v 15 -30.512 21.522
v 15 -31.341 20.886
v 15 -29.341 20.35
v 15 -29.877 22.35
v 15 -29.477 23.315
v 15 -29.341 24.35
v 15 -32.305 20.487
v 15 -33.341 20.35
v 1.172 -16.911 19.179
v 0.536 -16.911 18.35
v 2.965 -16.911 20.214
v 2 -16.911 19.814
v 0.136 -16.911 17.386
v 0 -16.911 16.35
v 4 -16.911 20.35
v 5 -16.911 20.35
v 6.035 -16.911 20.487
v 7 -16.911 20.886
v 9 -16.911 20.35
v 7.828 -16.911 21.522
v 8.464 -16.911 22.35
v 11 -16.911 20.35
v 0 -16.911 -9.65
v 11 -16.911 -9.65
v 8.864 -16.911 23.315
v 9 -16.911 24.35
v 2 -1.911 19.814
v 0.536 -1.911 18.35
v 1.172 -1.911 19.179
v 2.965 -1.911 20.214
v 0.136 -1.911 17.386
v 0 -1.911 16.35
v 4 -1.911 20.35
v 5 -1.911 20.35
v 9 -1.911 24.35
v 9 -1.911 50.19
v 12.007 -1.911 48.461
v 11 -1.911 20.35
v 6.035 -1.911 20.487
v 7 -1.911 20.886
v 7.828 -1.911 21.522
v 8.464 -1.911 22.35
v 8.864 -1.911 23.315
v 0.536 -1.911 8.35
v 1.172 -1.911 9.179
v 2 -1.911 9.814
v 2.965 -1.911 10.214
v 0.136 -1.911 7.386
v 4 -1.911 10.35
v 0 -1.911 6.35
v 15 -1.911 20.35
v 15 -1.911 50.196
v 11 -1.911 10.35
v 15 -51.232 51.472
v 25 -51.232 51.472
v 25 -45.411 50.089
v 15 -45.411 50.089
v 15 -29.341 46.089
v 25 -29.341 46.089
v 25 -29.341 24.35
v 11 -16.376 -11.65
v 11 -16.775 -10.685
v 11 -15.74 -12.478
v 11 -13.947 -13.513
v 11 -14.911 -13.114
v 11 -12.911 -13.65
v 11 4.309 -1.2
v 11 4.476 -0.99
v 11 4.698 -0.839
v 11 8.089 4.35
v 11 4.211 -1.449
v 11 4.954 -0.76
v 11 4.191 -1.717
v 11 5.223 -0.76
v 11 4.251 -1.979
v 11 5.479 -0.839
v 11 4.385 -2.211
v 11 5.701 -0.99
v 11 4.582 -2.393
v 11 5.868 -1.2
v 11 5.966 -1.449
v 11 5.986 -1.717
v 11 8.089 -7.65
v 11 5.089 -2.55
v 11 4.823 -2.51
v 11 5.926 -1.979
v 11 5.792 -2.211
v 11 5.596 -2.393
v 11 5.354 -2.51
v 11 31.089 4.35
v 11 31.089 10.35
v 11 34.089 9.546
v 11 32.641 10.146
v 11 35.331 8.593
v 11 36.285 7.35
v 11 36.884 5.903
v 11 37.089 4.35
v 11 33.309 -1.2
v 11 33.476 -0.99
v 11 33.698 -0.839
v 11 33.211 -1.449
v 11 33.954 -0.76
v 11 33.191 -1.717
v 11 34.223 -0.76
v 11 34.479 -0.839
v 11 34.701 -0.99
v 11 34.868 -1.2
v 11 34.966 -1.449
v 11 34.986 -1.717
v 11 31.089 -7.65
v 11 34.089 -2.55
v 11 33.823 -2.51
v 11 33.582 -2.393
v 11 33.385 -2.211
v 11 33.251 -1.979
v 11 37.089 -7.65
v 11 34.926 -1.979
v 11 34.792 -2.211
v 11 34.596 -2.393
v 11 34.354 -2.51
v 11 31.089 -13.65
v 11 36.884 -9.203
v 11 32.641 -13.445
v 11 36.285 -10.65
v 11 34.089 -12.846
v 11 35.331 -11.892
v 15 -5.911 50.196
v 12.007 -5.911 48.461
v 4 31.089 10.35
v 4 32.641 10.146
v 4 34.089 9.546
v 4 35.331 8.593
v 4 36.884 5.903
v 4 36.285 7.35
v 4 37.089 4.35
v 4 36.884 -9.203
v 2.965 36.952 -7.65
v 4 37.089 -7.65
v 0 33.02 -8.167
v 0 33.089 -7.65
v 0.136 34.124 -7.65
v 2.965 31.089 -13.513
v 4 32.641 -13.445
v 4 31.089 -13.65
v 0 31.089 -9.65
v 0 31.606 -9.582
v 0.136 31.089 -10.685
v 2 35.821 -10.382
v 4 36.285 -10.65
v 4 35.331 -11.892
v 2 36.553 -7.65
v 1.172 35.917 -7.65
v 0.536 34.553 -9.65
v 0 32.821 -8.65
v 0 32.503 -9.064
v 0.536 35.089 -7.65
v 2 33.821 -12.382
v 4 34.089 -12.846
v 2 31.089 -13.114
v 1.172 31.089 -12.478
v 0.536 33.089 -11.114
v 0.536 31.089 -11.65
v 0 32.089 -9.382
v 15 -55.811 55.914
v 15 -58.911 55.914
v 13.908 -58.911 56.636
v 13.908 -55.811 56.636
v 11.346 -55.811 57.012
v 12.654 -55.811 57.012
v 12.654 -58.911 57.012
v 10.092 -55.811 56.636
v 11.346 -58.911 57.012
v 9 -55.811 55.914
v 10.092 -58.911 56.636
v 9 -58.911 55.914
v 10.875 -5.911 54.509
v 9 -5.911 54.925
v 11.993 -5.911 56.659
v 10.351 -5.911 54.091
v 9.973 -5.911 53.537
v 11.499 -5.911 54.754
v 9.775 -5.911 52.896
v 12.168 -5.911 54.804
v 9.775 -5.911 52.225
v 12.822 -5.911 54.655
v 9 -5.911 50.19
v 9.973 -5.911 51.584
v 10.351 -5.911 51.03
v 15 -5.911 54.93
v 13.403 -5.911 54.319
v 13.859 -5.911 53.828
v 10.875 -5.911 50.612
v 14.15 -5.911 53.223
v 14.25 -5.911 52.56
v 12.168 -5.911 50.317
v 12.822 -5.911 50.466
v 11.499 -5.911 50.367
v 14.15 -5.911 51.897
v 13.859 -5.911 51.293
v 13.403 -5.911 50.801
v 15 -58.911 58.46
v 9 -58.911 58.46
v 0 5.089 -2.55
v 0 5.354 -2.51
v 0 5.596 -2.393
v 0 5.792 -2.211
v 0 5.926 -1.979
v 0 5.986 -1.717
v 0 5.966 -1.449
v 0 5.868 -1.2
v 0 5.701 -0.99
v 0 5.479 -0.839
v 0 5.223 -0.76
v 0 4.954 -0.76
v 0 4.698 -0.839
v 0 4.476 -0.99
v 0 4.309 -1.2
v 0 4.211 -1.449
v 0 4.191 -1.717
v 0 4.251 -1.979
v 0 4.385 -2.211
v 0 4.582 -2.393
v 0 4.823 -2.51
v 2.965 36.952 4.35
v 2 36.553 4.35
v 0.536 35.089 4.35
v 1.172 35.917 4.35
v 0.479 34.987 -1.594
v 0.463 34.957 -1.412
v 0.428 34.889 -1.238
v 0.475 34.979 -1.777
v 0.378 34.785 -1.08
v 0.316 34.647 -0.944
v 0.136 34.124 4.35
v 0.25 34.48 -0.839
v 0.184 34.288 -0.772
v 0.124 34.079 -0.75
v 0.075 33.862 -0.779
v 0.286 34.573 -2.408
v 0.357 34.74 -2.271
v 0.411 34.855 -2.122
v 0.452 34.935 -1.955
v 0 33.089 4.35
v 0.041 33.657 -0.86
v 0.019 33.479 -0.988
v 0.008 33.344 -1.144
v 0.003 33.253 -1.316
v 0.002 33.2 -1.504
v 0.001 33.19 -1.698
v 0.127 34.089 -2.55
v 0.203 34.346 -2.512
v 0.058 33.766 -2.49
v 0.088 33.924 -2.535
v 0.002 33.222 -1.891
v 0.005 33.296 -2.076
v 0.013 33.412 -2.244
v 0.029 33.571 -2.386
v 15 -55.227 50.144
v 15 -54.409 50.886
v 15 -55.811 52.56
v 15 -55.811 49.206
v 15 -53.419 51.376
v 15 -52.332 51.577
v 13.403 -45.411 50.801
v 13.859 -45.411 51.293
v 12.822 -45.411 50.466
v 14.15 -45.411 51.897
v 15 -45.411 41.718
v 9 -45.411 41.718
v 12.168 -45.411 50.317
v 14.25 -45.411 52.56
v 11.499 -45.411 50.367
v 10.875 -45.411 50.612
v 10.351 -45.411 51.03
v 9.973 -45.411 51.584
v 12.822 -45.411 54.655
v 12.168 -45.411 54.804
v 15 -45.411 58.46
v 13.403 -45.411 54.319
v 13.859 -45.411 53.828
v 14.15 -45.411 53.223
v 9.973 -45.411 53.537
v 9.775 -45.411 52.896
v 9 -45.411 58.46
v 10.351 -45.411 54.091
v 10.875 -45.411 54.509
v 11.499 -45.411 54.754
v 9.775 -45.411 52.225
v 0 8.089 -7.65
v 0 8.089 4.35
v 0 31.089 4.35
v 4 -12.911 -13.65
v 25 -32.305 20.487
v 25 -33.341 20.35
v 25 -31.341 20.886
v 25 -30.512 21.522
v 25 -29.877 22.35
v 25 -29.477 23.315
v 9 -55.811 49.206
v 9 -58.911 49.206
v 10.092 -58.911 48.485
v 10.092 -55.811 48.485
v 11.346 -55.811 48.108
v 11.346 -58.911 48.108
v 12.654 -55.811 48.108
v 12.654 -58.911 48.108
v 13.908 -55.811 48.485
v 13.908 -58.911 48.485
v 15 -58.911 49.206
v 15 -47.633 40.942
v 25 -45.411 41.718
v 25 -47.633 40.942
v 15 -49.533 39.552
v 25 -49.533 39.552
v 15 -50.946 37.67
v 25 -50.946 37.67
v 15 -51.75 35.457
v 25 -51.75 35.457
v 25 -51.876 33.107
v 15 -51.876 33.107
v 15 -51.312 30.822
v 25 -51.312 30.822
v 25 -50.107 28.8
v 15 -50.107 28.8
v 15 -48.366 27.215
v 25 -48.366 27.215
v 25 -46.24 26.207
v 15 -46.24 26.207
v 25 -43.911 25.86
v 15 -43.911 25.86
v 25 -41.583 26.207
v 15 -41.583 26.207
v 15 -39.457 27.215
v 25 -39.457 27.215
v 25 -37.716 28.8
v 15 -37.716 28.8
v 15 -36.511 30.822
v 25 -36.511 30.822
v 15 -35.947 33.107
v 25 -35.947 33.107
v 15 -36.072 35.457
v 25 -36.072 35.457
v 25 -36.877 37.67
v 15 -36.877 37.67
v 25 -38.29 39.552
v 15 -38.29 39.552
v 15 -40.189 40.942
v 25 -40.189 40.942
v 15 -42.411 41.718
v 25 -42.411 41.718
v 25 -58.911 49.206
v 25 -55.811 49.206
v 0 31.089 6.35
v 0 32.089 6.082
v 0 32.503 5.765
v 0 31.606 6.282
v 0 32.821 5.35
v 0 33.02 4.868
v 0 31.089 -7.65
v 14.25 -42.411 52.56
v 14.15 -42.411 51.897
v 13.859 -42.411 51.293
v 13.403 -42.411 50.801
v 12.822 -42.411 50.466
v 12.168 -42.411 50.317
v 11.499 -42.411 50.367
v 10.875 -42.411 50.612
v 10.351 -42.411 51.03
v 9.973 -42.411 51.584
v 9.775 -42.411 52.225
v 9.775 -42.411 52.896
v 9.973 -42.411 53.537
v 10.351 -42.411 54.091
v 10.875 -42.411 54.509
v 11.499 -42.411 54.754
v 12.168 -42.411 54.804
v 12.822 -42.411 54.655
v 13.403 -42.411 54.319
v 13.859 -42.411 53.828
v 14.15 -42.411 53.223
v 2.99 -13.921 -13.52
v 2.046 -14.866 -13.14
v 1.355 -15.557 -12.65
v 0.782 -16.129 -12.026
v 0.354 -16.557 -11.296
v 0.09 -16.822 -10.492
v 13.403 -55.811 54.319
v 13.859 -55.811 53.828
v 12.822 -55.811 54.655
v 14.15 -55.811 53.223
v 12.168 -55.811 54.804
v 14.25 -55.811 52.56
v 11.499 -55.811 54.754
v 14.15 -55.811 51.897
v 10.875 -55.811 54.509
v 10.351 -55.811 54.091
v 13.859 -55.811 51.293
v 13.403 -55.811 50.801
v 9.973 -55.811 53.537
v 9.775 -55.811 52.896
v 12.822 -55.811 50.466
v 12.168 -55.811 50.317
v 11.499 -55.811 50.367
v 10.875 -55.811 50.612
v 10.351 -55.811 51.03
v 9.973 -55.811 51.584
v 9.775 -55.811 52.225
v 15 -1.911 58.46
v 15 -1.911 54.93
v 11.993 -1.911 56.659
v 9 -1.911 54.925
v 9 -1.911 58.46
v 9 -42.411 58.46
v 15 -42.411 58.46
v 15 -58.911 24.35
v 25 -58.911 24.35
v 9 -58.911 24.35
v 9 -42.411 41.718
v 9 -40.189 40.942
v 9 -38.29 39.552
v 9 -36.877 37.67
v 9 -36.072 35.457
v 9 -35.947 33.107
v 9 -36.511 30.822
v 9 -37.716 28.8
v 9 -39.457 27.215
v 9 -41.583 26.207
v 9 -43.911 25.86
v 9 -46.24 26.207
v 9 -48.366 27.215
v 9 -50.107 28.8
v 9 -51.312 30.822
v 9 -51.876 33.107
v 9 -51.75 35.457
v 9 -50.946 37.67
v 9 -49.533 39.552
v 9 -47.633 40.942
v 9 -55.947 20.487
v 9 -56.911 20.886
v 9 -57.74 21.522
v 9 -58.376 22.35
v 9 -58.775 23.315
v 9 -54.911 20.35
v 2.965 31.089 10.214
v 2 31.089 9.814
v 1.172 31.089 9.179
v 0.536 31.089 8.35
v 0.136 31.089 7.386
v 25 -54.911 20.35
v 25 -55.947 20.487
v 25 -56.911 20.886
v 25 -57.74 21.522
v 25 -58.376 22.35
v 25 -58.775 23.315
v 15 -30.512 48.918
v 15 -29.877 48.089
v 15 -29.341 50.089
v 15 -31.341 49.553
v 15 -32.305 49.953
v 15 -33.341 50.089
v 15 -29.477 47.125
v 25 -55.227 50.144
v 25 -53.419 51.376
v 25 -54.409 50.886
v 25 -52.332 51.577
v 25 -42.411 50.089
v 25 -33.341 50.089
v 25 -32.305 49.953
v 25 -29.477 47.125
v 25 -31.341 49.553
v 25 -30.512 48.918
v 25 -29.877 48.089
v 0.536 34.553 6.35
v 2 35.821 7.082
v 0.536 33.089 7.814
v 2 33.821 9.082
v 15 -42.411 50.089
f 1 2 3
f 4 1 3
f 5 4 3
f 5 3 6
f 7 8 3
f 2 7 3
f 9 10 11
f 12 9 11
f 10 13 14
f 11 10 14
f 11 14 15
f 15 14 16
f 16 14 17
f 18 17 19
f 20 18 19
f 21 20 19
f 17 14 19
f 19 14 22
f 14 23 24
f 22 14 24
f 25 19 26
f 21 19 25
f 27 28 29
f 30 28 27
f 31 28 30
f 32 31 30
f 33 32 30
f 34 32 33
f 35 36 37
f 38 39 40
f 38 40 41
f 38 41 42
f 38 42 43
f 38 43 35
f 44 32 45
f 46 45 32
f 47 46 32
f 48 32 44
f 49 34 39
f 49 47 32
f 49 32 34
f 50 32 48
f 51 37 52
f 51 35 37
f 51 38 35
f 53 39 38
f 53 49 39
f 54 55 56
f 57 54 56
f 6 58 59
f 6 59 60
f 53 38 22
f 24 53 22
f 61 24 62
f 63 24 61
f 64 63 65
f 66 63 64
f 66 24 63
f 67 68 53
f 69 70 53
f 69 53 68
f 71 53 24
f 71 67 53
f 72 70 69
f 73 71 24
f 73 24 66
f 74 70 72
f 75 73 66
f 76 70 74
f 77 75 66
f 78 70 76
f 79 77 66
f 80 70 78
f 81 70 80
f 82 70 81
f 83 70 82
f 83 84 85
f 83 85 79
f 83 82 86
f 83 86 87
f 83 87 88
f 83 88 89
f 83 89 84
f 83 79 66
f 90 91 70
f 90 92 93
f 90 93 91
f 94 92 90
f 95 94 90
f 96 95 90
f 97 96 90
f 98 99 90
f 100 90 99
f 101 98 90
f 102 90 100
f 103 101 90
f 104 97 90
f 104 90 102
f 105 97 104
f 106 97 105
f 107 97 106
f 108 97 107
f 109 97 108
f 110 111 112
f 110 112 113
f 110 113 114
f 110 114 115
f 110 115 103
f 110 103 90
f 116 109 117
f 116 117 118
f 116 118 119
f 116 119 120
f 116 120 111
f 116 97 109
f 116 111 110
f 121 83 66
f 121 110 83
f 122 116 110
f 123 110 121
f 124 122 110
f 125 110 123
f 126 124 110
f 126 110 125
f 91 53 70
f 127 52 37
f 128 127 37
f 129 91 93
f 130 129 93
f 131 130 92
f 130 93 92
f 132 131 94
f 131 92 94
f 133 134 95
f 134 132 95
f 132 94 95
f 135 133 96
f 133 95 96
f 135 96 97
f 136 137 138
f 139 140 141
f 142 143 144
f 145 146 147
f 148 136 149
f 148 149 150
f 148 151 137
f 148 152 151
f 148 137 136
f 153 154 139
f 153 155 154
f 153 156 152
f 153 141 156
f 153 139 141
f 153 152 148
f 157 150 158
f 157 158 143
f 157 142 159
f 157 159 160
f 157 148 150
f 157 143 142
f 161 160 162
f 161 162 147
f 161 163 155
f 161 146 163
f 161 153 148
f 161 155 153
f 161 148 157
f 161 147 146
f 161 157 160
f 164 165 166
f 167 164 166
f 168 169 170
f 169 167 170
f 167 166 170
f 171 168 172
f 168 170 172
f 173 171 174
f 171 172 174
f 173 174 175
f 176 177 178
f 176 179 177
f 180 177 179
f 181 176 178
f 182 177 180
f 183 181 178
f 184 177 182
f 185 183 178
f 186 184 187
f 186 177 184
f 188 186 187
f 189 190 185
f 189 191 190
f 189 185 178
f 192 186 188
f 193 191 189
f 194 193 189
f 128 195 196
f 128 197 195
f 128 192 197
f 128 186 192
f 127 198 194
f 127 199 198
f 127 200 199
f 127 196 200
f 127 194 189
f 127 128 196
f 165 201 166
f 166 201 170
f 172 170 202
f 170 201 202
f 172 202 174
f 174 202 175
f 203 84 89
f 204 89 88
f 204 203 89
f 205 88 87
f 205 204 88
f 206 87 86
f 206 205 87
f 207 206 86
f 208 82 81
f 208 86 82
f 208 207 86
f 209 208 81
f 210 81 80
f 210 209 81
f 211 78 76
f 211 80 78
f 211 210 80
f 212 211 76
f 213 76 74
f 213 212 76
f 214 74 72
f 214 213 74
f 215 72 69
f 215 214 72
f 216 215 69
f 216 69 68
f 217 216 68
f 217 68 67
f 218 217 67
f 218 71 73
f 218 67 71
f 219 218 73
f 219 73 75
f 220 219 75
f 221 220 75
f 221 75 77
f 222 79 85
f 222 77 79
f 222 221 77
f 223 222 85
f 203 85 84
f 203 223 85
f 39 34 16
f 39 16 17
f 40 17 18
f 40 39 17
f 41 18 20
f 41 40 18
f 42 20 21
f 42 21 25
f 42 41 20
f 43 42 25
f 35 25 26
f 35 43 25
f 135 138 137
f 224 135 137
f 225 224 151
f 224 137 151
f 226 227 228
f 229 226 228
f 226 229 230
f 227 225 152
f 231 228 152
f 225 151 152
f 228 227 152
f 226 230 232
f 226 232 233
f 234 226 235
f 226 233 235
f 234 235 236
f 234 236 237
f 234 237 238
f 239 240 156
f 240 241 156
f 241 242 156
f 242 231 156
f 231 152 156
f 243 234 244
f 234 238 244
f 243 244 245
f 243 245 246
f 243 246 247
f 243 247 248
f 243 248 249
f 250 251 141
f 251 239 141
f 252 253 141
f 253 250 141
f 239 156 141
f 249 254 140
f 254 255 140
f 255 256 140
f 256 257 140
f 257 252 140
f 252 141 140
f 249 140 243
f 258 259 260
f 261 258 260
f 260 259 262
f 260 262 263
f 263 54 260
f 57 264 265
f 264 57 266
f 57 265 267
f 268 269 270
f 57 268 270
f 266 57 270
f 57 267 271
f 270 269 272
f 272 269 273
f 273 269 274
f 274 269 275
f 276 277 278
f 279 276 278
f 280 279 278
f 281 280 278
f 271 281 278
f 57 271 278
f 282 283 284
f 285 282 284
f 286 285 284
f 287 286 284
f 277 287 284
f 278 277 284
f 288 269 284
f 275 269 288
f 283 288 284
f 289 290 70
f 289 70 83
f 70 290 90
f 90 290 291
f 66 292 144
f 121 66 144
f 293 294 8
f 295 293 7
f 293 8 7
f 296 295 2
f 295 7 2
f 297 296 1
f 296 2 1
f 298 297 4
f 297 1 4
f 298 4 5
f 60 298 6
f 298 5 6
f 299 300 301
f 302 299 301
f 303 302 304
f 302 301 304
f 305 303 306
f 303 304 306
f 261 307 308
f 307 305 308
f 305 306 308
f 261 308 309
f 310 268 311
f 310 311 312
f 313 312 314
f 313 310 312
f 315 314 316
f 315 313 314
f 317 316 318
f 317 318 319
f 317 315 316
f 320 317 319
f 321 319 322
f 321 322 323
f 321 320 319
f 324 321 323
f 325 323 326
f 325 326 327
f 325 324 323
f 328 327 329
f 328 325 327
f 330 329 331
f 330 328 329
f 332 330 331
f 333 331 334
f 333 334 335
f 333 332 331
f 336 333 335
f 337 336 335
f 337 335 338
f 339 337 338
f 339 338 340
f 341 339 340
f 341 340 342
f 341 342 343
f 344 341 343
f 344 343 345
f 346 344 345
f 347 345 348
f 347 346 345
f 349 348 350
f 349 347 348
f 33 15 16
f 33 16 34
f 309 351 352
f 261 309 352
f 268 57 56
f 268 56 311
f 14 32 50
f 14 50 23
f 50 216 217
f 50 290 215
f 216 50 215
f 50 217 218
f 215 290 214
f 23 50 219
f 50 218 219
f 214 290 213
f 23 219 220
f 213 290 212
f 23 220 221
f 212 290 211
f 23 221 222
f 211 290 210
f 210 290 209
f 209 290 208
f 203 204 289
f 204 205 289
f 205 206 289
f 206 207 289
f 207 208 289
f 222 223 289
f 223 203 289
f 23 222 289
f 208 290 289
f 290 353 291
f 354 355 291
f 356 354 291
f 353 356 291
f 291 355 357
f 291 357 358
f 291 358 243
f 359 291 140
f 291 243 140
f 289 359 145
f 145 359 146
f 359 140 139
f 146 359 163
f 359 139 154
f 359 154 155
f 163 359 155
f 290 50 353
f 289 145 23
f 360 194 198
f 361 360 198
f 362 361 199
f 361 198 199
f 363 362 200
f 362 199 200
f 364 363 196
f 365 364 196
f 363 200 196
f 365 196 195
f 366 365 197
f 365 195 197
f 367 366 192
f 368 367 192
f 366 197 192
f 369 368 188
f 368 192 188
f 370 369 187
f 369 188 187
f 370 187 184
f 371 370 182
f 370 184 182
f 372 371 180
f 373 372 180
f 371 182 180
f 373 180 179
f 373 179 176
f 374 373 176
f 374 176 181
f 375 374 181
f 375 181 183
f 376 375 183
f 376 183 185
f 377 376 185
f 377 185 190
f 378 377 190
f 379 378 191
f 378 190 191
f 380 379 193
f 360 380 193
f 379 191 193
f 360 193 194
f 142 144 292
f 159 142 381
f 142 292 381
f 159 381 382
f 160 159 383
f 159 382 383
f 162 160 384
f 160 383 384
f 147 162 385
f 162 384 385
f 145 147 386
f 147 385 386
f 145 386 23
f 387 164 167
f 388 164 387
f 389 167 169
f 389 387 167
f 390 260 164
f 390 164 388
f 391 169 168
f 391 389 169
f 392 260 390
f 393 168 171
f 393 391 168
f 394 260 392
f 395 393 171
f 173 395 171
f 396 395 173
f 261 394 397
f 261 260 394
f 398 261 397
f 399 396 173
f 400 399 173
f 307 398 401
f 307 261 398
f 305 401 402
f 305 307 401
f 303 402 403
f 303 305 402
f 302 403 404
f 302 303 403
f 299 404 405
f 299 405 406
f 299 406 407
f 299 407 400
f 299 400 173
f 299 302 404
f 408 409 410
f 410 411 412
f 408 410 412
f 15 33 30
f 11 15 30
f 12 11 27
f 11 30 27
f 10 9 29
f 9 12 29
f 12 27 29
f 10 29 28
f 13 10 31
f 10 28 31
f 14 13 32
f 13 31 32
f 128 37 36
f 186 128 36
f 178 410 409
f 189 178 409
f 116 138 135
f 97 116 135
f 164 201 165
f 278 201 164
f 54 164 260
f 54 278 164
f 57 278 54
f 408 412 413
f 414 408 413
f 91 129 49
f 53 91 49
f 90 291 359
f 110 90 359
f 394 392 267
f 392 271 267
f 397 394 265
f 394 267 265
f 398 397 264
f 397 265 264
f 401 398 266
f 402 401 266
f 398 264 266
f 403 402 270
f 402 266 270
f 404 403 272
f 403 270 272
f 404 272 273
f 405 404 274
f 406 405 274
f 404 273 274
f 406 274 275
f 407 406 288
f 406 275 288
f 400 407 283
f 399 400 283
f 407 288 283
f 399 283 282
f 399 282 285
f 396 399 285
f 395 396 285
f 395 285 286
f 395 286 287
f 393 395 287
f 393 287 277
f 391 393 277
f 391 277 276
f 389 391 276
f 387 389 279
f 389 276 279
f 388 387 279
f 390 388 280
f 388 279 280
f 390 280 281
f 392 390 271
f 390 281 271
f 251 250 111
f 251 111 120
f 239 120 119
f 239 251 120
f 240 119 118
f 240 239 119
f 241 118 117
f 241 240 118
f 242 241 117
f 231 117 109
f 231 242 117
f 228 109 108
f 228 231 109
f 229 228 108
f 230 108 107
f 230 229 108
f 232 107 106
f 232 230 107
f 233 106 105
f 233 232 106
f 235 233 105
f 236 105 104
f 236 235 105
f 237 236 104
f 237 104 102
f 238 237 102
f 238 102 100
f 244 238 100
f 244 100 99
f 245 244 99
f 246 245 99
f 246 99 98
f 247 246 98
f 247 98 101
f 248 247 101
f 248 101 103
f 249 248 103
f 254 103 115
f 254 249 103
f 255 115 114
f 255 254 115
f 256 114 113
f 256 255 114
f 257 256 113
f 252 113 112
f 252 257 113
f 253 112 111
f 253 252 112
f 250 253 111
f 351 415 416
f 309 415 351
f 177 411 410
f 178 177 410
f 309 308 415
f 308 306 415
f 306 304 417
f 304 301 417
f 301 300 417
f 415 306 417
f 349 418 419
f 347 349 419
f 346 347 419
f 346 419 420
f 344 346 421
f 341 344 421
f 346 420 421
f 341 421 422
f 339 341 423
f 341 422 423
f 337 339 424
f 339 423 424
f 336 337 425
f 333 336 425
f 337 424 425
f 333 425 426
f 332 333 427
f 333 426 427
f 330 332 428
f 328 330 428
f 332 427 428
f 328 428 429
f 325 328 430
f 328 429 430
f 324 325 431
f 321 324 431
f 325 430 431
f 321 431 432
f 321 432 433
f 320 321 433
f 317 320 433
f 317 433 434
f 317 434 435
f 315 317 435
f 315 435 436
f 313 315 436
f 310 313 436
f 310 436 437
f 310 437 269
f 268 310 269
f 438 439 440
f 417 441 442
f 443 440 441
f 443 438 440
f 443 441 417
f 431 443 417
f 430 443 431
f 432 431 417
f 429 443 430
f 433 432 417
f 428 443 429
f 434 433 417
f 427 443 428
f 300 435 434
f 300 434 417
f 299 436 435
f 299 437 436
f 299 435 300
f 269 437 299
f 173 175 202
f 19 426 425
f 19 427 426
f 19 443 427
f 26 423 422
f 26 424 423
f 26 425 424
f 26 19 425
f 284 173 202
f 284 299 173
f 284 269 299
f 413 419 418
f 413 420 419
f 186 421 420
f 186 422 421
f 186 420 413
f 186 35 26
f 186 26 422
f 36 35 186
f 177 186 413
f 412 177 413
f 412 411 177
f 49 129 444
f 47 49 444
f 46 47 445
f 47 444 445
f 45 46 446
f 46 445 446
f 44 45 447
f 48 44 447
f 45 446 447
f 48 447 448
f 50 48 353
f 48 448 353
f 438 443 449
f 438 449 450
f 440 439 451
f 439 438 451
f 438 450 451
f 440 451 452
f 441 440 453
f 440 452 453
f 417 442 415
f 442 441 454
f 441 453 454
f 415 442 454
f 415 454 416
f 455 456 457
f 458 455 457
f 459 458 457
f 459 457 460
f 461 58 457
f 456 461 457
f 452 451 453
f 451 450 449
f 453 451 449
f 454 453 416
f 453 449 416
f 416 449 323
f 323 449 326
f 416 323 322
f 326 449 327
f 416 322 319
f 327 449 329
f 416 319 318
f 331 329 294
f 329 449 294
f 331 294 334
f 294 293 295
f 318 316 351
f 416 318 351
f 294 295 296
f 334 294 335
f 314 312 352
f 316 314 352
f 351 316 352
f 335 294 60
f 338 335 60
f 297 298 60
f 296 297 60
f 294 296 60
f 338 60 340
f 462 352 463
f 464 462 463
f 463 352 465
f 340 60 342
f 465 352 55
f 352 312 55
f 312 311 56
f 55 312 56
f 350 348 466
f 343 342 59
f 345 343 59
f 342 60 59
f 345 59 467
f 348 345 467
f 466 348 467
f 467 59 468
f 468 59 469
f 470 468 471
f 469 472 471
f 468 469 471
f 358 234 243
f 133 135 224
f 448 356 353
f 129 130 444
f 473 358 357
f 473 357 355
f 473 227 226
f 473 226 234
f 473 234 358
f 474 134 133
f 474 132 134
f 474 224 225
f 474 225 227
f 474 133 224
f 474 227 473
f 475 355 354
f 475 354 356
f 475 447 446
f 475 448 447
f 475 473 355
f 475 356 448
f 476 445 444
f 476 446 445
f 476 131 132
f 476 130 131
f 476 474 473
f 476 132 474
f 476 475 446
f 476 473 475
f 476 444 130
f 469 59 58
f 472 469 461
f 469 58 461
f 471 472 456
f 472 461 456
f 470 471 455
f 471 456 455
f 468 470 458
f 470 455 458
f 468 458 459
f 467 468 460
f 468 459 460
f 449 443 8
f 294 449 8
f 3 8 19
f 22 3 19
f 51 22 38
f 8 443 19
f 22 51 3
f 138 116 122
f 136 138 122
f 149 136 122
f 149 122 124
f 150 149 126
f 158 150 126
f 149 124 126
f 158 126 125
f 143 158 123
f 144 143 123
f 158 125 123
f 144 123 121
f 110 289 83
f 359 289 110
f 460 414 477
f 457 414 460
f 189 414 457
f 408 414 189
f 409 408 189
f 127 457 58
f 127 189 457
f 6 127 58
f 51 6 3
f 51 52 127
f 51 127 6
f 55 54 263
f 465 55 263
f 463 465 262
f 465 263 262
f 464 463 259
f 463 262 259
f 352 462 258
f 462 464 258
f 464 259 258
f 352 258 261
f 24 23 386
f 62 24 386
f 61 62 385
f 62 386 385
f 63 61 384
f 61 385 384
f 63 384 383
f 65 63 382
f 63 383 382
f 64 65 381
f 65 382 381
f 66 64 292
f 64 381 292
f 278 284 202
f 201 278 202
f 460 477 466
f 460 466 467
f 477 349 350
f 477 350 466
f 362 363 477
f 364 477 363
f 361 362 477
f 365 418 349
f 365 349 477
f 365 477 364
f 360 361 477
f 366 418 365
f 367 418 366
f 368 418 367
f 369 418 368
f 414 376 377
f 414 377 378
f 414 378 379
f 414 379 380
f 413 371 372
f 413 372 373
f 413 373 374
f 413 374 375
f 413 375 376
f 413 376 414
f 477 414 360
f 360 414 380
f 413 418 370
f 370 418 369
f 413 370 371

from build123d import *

# Parameters (mm, degrees)
SKETCH1_R                                        = 0.9
SKETCH1_W                                        = 12
SKETCH1_H                                        = 23
BOSS_EXTRUDE1_DEPTH                              = 15
CBORE_FOR_M4_PAN_HEAD_MACHINE_SCREW2_D           = 4.5
CBORE_FOR_M4_PAN_HEAD_MACHINE_SCREW2_CBORE_D     = 9
CBORE_FOR_M4_PAN_HEAD_MACHINE_SCREW2_CBORE_DEPTH = 3.1
CUT_EXTRUDE2_DEPTH                               = 4
SKETCH11_W                                       = 38.11
SKETCH11_H                                       = 57
CUT_EXTRUDE3_DEPTH                               = 9
FILLET3_R                                        = 6
FILLET4_R                                        = 4
BOSS_EXTRUDE2_DEPTH                              = 10
FILLET2_R                                        = 4
SKETCH14_W                                       = 40.700591816
SKETCH14_H                                       = 70
CUT_EXTRUDE4_DEPTH                               = 4


with BuildPart() as part:
    # Sketch1 → Boss-Extrude1 (new body)
    with BuildSketch(Plane(origin=(0, 0, 0), x_dir=(0, 0, -1), z_dir=(1, 0, 0))):
        with BuildLine():
            Line((-58.460295908, -42.411439664), (-41.718412731, -42.411439664))
            ThreePointArc((-41.718412731, -42.411439664), (-25.860295908, -43.911439664), (-41.718412731, -45.411439664))
            Line((-41.718412731, -45.411439664), (-58.460295908, -45.411439664))
            Line((-58.460295908, -45.411439664), (-58.460295908, -58.911439664))
            Line((-58.460295908, -58.911439664), (-20.350295908, -58.911439664))
            Line((-20.350295908, -58.911439664), (-20.350295908, -16.911439664))
            Line((-20.350295908, -16.911439664), (13.649704092, -16.911439664))
            Line((13.649704092, -16.911439664), (13.649704092, 37.088560336))
            Line((13.649704092, 37.088560336), (-10.350295908, 37.088560336))
            Line((-10.350295908, 37.088560336), (-10.350295908, -1.911439664))
            Line((-10.350295908, -1.911439664), (-58.460295908, -1.911439664))
            Line((-58.460295908, -1.911439664), (-58.460295908, -28.911439664))
            Line((-58.460295908, -28.911439664), (-58.460295908, -42.411439664))
        make_face()
        with Locations((1.649704092, 34.088560336)):
            Circle(SKETCH1_R, mode=Mode.SUBTRACT)
        with Locations((1.649704092, 5.088560336)):
            Circle(SKETCH1_R, mode=Mode.SUBTRACT)
        with Locations((1.649704092, 19.588560336)):
            Rectangle(SKETCH1_W, SKETCH1_H, mode=Mode.SUBTRACT)
    extrude(amount=BOSS_EXTRUDE1_DEPTH)

    # CBORE for M4 Pan Head Machine Screw2 (through all)
    with Locations(Plane(origin=(0, -58.911439664, 0), x_dir=(-1, 0, 0), z_dir=(0, -1, 0))):
        with Locations((-12, -52.560295908)):
            CounterBoreHole(CBORE_FOR_M4_PAN_HEAD_MACHINE_SCREW2_D / 2, CBORE_FOR_M4_PAN_HEAD_MACHINE_SCREW2_CBORE_D / 2, CBORE_FOR_M4_PAN_HEAD_MACHINE_SCREW2_CBORE_DEPTH)

    # Sketch7 → Cut-Extrude2 (cut)
    with BuildSketch(Plane(origin=(0, -1.911439664, 0), x_dir=(1, 0, 0), z_dir=(0, 1, 0))):
        Polygon((15.553380664, -50.516569118), (12.006771014, -48.461114589), (8.45339035, -50.504841379), (8.446619336, -54.604022698), (11.993228986, -56.659477227), (15.54660965, -54.615750437), align=None)
    extrude(amount=-CUT_EXTRUDE2_DEPTH, mode=Mode.SUBTRACT)

    # Sketch11 → Cut-Extrude3 (cut)
    with BuildSketch(Plane.ZY):
        with Locations((39.405295908, -30.411439664)):
            Rectangle(SKETCH11_W, SKETCH11_H)
    extrude(amount=-CUT_EXTRUDE3_DEPTH, mode=Mode.SUBTRACT)

    # Fillet3
    fillet3_edges = [part.edges().sort_by_distance(p)[0] for p in [
        (7.5, 37.088560336, 10.350295908),
        (7.5, 37.088560336, -13.649704092),
    ]]
    fillet(fillet3_edges, radius=FILLET3_R)

    # Fillet4
    # the kernel refuses this fillet: 4 mm, written as the material it takes off along each edge
    with BuildSketch(Plane(origin=(0, 31.088560336, 10.350295908), x_dir=(0, 0, -1), z_dir=(0, -1, 0))) as fillet4_piece_1:
        with BuildLine():
            CenterArc((FILLET4_R, FILLET4_R), FILLET4_R, 180, 90)
            Line((0, FILLET4_R), (0, 0))
            Line((0, 0), (FILLET4_R, 0))
        make_face()
    extrude(amount=33, mode=Mode.SUBTRACT)
    with BuildSketch(Plane(origin=(15, 31.088560336, 10.350295908), x_dir=(0, 0, -1), z_dir=(0, -1, 0))) as fillet4_piece_2:
        with BuildLine():
            CenterArc((FILLET4_R, -FILLET4_R), FILLET4_R, 90, 90)
            Line((0, -FILLET4_R), (0, 0))
            Line((0, 0), (FILLET4_R, 0))
        make_face()
    extrude(amount=33, mode=Mode.SUBTRACT)
    with BuildSketch(Plane(origin=(0, 37.088560336, -7.649704092), x_dir=(1, 0, 0), z_dir=(0, 0, 1))) as fillet4_piece_3:
        with BuildLine():
            CenterArc((FILLET4_R, -FILLET4_R), FILLET4_R, 90, 90)
            Line((0, -FILLET4_R), (0, 0))
            Line((0, 0), (FILLET4_R, 0))
        make_face()
    extrude(amount=12, mode=Mode.SUBTRACT)
    with BuildSketch(Plane(origin=(0, 31.088560336, -7.649704092), x_dir=(0, 1, 0), z_dir=(0, 0, 1))) as fillet4_piece_4:
        with BuildLine():
            CenterArc((6 - FILLET4_R, -FILLET4_R), FILLET4_R, 0, 90)
            Line((6, -FILLET4_R), (6, 0))
            Line((6, 0), (6 - FILLET4_R, 0))
        make_face()
    revolve(axis=Axis((0, 31.088560336, -7.649704092), (-1, 0, 0)), revolution_arc=90, mode=Mode.SUBTRACT)
    with BuildSketch(Plane(origin=(0, 31.088560336, 4.350295908), x_dir=(0, 1, 0), z_dir=(0, 0, -1))) as fillet4_piece_5:
        with BuildLine():
            CenterArc((6 - FILLET4_R, FILLET4_R), FILLET4_R, 270, 90)
            Line((6, FILLET4_R), (6, 0))
            Line((6, 0), (6 - FILLET4_R, 0))
        make_face()
    revolve(axis=Axis((0, 31.088560336, 4.350295908), (1, 0, 0)), revolution_arc=90, mode=Mode.SUBTRACT)
    with BuildSketch(Plane(origin=(15, 37.088560336, -7.649704092), x_dir=(-1, 0, 0), z_dir=(0, 0, 1))) as fillet4_piece_6:
        with BuildLine():
            CenterArc((FILLET4_R, FILLET4_R), FILLET4_R, 180, 90)
            Line((0, FILLET4_R), (0, 0))
            Line((0, 0), (FILLET4_R, 0))
        make_face()
    extrude(amount=12, mode=Mode.SUBTRACT)
    with BuildSketch(Plane(origin=(15, 31.088560336, -7.649704092), x_dir=(0, 1, 0), z_dir=(0, 0, 1))) as fillet4_piece_7:
        with BuildLine():
            CenterArc((6 - FILLET4_R, FILLET4_R), FILLET4_R, 270, 90)
            Line((6 - FILLET4_R, 0), (6, 0))
            Line((6, 0), (6, FILLET4_R))
        make_face()
    revolve(axis=Axis((15, 31.088560336, -7.649704092), (-1, 0, 0)), revolution_arc=90, mode=Mode.SUBTRACT)
    with BuildSketch(Plane(origin=(15, 31.088560336, 4.350295908), x_dir=(0, 1, 0), z_dir=(0, 0, -1))) as fillet4_piece_8:
        with BuildLine():
            CenterArc((6 - FILLET4_R, -FILLET4_R), FILLET4_R, 0, 90)
            Line((6 - FILLET4_R, 0), (6, 0))
            Line((6, 0), (6, -FILLET4_R))
        make_face()
    revolve(axis=Axis((15, 31.088560336, 4.350295908), (1, 0, 0)), revolution_arc=90, mode=Mode.SUBTRACT)
    with BuildSketch(Plane(origin=(0, -26.911439664, -13.649704092), x_dir=(0, 0, 1), z_dir=(0, 1, 0))) as fillet4_piece_9:
        with BuildLine():
            CenterArc((FILLET4_R, FILLET4_R), FILLET4_R, 180, 90)
            Line((0, FILLET4_R), (0, 0))
            Line((0, 0), (FILLET4_R, 0))
        make_face()
    extrude(amount=58, mode=Mode.SUBTRACT)
    with BuildSketch(Plane(origin=(-10, -16.911439664, -13.649704092), x_dir=(0, 1, 0), z_dir=(1, 0, 0))) as fillet4_piece_10:
        with BuildLine():
            CenterArc((FILLET4_R, FILLET4_R), FILLET4_R, 180, 90)
            Line((0, FILLET4_R), (0, 0))
            Line((0, 0), (FILLET4_R, 0))
        make_face()
    extrude(amount=35, mode=Mode.SUBTRACT)
    with BuildSketch(Plane(origin=(15, -26.911439664, -13.649704092), x_dir=(0, 0, 1), z_dir=(0, 1, 0))) as fillet4_piece_11:
        with BuildLine():
            CenterArc((FILLET4_R, -FILLET4_R), FILLET4_R, 90, 90)
            Line((0, -FILLET4_R), (0, 0))
            Line((0, 0), (FILLET4_R, 0))
        make_face()
    extrude(amount=58, mode=Mode.SUBTRACT)

    # Sketch13 → Boss-Extrude2 (add)
    with BuildSketch(Plane(origin=(15, 0, 0), x_dir=(0, 0, -1), z_dir=(1, 0, 0))):
        with BuildLine():
            Line((-41.718412731, -42.411439664), (-50.089354319, -42.411439664))
            Line((-50.089354319, -42.411439664), (-50.089354319, -29.340681858))
            Line((-50.089354319, -29.340681858), (-20.350295908, -29.340681858))
            Line((-20.350295908, -29.340681858), (-20.350295908, -58.911439664))
            Line((-20.350295908, -58.911439664), (-49.206193942, -58.911439664))
            Line((-49.206193942, -58.911439664), (-49.206193942, -55.811439664))
            Line((-49.206193942, -55.811439664), (-52.560295908, -55.811439664))
            Line((-52.560295908, -55.811439664), (-50.089354319, -45.411439664))
            Line((-50.089354319, -45.411439664), (-41.718412731, -45.411439664))
            ThreePointArc((-41.718412731, -45.411439664), (-25.860295908, -43.911439664), (-41.718412731, -42.411439664))
        make_face()
    extrude(amount=BOSS_EXTRUDE2_DEPTH)

    # Fillet2
    # the kernel refuses this fillet: 4 mm, written as the material it adds along each edge
    with BuildSketch(Plane(origin=(9, -1.911439664, 20.350295908), x_dir=(-1, 0, 0), z_dir=(0, -1, 0))) as fillet2_piece_1:
        with BuildLine():
            CenterArc((FILLET2_R, -FILLET2_R), FILLET2_R, 90, 90)
            Line((0, -FILLET2_R), (0, 0))
            Line((0, 0), (FILLET2_R, 0))
        make_face()
    extrude(amount=15)
    # the kernel refuses this fillet: 4 mm, written as the material it takes off along each edge
    with BuildSketch(Plane(origin=(35, -58.911439664, 20.350295908), x_dir=(0, 1, 0), z_dir=(-1, 0, 0))) as fillet2_2_piece_1:
        with BuildLine():
            CenterArc((FILLET2_R, -FILLET2_R), FILLET2_R, 90, 90)
            Line((0, -FILLET2_R), (0, 0))
            Line((0, 0), (FILLET2_R, 0))
        make_face()
    extrude(amount=36, mode=Mode.SUBTRACT)
    with BuildSketch(Plane(origin=(0, 8.088560336, 20.350295908), x_dir=(0, 0, -1), z_dir=(0, -1, 0))) as fillet2_2_piece_2:
        with BuildLine():
            CenterArc((FILLET2_R, FILLET2_R), FILLET2_R, 180, 90)
            Line((0, FILLET2_R), (0, 0))
            Line((0, 0), (FILLET2_R, 0))
        make_face()
    extrude(amount=35, mode=Mode.SUBTRACT)
    with BuildSketch(Plane(origin=(15, -55.811439664, 52.560295908), x_dir=(0, 0, -1), z_dir=(1, 0, 0))) as fillet2_2_piece_3:
        with BuildLine():
            CenterArc((4.979691241, 3.654785836), FILLET2_R, 166.634871225, 79.386408779)
            Line((1.088024265, 4.579409084), (0, 0))
            Line((0, 0), (3.354101966, 0))
        make_face()
    extrude(amount=21.76721727, mode=Mode.SUBTRACT)
    with BuildSketch(Plane(origin=(15, -29.340681858, 20.350295908), x_dir=(0, -1, 0), z_dir=(1, 0, 0)), Plane(origin=(15, -29.340681858, 50.089354319), x_dir=(0, 0, -1), z_dir=(1, 0, 0))) as fillet2_2_piece_4:
        with BuildLine():
            CenterArc((FILLET2_R, -FILLET2_R), FILLET2_R, 90, 90)
            Line((0, -FILLET2_R), (0, 0))
            Line((0, 0), (FILLET2_R, 0))
        make_face()
    extrude(amount=20, mode=Mode.SUBTRACT)

    # Sketch14 → Cut-Extrude4 (cut)
    with BuildSketch(Plane(origin=(15, 0, 0), x_dir=(0, 0, -1), z_dir=(1, 0, 0))):
        with Locations((0, 5.659318142)):
            Rectangle(SKETCH14_W, SKETCH14_H)
    extrude(amount=-CUT_EXTRUDE4_DEPTH, mode=Mode.SUBTRACT)


solid = part.part
